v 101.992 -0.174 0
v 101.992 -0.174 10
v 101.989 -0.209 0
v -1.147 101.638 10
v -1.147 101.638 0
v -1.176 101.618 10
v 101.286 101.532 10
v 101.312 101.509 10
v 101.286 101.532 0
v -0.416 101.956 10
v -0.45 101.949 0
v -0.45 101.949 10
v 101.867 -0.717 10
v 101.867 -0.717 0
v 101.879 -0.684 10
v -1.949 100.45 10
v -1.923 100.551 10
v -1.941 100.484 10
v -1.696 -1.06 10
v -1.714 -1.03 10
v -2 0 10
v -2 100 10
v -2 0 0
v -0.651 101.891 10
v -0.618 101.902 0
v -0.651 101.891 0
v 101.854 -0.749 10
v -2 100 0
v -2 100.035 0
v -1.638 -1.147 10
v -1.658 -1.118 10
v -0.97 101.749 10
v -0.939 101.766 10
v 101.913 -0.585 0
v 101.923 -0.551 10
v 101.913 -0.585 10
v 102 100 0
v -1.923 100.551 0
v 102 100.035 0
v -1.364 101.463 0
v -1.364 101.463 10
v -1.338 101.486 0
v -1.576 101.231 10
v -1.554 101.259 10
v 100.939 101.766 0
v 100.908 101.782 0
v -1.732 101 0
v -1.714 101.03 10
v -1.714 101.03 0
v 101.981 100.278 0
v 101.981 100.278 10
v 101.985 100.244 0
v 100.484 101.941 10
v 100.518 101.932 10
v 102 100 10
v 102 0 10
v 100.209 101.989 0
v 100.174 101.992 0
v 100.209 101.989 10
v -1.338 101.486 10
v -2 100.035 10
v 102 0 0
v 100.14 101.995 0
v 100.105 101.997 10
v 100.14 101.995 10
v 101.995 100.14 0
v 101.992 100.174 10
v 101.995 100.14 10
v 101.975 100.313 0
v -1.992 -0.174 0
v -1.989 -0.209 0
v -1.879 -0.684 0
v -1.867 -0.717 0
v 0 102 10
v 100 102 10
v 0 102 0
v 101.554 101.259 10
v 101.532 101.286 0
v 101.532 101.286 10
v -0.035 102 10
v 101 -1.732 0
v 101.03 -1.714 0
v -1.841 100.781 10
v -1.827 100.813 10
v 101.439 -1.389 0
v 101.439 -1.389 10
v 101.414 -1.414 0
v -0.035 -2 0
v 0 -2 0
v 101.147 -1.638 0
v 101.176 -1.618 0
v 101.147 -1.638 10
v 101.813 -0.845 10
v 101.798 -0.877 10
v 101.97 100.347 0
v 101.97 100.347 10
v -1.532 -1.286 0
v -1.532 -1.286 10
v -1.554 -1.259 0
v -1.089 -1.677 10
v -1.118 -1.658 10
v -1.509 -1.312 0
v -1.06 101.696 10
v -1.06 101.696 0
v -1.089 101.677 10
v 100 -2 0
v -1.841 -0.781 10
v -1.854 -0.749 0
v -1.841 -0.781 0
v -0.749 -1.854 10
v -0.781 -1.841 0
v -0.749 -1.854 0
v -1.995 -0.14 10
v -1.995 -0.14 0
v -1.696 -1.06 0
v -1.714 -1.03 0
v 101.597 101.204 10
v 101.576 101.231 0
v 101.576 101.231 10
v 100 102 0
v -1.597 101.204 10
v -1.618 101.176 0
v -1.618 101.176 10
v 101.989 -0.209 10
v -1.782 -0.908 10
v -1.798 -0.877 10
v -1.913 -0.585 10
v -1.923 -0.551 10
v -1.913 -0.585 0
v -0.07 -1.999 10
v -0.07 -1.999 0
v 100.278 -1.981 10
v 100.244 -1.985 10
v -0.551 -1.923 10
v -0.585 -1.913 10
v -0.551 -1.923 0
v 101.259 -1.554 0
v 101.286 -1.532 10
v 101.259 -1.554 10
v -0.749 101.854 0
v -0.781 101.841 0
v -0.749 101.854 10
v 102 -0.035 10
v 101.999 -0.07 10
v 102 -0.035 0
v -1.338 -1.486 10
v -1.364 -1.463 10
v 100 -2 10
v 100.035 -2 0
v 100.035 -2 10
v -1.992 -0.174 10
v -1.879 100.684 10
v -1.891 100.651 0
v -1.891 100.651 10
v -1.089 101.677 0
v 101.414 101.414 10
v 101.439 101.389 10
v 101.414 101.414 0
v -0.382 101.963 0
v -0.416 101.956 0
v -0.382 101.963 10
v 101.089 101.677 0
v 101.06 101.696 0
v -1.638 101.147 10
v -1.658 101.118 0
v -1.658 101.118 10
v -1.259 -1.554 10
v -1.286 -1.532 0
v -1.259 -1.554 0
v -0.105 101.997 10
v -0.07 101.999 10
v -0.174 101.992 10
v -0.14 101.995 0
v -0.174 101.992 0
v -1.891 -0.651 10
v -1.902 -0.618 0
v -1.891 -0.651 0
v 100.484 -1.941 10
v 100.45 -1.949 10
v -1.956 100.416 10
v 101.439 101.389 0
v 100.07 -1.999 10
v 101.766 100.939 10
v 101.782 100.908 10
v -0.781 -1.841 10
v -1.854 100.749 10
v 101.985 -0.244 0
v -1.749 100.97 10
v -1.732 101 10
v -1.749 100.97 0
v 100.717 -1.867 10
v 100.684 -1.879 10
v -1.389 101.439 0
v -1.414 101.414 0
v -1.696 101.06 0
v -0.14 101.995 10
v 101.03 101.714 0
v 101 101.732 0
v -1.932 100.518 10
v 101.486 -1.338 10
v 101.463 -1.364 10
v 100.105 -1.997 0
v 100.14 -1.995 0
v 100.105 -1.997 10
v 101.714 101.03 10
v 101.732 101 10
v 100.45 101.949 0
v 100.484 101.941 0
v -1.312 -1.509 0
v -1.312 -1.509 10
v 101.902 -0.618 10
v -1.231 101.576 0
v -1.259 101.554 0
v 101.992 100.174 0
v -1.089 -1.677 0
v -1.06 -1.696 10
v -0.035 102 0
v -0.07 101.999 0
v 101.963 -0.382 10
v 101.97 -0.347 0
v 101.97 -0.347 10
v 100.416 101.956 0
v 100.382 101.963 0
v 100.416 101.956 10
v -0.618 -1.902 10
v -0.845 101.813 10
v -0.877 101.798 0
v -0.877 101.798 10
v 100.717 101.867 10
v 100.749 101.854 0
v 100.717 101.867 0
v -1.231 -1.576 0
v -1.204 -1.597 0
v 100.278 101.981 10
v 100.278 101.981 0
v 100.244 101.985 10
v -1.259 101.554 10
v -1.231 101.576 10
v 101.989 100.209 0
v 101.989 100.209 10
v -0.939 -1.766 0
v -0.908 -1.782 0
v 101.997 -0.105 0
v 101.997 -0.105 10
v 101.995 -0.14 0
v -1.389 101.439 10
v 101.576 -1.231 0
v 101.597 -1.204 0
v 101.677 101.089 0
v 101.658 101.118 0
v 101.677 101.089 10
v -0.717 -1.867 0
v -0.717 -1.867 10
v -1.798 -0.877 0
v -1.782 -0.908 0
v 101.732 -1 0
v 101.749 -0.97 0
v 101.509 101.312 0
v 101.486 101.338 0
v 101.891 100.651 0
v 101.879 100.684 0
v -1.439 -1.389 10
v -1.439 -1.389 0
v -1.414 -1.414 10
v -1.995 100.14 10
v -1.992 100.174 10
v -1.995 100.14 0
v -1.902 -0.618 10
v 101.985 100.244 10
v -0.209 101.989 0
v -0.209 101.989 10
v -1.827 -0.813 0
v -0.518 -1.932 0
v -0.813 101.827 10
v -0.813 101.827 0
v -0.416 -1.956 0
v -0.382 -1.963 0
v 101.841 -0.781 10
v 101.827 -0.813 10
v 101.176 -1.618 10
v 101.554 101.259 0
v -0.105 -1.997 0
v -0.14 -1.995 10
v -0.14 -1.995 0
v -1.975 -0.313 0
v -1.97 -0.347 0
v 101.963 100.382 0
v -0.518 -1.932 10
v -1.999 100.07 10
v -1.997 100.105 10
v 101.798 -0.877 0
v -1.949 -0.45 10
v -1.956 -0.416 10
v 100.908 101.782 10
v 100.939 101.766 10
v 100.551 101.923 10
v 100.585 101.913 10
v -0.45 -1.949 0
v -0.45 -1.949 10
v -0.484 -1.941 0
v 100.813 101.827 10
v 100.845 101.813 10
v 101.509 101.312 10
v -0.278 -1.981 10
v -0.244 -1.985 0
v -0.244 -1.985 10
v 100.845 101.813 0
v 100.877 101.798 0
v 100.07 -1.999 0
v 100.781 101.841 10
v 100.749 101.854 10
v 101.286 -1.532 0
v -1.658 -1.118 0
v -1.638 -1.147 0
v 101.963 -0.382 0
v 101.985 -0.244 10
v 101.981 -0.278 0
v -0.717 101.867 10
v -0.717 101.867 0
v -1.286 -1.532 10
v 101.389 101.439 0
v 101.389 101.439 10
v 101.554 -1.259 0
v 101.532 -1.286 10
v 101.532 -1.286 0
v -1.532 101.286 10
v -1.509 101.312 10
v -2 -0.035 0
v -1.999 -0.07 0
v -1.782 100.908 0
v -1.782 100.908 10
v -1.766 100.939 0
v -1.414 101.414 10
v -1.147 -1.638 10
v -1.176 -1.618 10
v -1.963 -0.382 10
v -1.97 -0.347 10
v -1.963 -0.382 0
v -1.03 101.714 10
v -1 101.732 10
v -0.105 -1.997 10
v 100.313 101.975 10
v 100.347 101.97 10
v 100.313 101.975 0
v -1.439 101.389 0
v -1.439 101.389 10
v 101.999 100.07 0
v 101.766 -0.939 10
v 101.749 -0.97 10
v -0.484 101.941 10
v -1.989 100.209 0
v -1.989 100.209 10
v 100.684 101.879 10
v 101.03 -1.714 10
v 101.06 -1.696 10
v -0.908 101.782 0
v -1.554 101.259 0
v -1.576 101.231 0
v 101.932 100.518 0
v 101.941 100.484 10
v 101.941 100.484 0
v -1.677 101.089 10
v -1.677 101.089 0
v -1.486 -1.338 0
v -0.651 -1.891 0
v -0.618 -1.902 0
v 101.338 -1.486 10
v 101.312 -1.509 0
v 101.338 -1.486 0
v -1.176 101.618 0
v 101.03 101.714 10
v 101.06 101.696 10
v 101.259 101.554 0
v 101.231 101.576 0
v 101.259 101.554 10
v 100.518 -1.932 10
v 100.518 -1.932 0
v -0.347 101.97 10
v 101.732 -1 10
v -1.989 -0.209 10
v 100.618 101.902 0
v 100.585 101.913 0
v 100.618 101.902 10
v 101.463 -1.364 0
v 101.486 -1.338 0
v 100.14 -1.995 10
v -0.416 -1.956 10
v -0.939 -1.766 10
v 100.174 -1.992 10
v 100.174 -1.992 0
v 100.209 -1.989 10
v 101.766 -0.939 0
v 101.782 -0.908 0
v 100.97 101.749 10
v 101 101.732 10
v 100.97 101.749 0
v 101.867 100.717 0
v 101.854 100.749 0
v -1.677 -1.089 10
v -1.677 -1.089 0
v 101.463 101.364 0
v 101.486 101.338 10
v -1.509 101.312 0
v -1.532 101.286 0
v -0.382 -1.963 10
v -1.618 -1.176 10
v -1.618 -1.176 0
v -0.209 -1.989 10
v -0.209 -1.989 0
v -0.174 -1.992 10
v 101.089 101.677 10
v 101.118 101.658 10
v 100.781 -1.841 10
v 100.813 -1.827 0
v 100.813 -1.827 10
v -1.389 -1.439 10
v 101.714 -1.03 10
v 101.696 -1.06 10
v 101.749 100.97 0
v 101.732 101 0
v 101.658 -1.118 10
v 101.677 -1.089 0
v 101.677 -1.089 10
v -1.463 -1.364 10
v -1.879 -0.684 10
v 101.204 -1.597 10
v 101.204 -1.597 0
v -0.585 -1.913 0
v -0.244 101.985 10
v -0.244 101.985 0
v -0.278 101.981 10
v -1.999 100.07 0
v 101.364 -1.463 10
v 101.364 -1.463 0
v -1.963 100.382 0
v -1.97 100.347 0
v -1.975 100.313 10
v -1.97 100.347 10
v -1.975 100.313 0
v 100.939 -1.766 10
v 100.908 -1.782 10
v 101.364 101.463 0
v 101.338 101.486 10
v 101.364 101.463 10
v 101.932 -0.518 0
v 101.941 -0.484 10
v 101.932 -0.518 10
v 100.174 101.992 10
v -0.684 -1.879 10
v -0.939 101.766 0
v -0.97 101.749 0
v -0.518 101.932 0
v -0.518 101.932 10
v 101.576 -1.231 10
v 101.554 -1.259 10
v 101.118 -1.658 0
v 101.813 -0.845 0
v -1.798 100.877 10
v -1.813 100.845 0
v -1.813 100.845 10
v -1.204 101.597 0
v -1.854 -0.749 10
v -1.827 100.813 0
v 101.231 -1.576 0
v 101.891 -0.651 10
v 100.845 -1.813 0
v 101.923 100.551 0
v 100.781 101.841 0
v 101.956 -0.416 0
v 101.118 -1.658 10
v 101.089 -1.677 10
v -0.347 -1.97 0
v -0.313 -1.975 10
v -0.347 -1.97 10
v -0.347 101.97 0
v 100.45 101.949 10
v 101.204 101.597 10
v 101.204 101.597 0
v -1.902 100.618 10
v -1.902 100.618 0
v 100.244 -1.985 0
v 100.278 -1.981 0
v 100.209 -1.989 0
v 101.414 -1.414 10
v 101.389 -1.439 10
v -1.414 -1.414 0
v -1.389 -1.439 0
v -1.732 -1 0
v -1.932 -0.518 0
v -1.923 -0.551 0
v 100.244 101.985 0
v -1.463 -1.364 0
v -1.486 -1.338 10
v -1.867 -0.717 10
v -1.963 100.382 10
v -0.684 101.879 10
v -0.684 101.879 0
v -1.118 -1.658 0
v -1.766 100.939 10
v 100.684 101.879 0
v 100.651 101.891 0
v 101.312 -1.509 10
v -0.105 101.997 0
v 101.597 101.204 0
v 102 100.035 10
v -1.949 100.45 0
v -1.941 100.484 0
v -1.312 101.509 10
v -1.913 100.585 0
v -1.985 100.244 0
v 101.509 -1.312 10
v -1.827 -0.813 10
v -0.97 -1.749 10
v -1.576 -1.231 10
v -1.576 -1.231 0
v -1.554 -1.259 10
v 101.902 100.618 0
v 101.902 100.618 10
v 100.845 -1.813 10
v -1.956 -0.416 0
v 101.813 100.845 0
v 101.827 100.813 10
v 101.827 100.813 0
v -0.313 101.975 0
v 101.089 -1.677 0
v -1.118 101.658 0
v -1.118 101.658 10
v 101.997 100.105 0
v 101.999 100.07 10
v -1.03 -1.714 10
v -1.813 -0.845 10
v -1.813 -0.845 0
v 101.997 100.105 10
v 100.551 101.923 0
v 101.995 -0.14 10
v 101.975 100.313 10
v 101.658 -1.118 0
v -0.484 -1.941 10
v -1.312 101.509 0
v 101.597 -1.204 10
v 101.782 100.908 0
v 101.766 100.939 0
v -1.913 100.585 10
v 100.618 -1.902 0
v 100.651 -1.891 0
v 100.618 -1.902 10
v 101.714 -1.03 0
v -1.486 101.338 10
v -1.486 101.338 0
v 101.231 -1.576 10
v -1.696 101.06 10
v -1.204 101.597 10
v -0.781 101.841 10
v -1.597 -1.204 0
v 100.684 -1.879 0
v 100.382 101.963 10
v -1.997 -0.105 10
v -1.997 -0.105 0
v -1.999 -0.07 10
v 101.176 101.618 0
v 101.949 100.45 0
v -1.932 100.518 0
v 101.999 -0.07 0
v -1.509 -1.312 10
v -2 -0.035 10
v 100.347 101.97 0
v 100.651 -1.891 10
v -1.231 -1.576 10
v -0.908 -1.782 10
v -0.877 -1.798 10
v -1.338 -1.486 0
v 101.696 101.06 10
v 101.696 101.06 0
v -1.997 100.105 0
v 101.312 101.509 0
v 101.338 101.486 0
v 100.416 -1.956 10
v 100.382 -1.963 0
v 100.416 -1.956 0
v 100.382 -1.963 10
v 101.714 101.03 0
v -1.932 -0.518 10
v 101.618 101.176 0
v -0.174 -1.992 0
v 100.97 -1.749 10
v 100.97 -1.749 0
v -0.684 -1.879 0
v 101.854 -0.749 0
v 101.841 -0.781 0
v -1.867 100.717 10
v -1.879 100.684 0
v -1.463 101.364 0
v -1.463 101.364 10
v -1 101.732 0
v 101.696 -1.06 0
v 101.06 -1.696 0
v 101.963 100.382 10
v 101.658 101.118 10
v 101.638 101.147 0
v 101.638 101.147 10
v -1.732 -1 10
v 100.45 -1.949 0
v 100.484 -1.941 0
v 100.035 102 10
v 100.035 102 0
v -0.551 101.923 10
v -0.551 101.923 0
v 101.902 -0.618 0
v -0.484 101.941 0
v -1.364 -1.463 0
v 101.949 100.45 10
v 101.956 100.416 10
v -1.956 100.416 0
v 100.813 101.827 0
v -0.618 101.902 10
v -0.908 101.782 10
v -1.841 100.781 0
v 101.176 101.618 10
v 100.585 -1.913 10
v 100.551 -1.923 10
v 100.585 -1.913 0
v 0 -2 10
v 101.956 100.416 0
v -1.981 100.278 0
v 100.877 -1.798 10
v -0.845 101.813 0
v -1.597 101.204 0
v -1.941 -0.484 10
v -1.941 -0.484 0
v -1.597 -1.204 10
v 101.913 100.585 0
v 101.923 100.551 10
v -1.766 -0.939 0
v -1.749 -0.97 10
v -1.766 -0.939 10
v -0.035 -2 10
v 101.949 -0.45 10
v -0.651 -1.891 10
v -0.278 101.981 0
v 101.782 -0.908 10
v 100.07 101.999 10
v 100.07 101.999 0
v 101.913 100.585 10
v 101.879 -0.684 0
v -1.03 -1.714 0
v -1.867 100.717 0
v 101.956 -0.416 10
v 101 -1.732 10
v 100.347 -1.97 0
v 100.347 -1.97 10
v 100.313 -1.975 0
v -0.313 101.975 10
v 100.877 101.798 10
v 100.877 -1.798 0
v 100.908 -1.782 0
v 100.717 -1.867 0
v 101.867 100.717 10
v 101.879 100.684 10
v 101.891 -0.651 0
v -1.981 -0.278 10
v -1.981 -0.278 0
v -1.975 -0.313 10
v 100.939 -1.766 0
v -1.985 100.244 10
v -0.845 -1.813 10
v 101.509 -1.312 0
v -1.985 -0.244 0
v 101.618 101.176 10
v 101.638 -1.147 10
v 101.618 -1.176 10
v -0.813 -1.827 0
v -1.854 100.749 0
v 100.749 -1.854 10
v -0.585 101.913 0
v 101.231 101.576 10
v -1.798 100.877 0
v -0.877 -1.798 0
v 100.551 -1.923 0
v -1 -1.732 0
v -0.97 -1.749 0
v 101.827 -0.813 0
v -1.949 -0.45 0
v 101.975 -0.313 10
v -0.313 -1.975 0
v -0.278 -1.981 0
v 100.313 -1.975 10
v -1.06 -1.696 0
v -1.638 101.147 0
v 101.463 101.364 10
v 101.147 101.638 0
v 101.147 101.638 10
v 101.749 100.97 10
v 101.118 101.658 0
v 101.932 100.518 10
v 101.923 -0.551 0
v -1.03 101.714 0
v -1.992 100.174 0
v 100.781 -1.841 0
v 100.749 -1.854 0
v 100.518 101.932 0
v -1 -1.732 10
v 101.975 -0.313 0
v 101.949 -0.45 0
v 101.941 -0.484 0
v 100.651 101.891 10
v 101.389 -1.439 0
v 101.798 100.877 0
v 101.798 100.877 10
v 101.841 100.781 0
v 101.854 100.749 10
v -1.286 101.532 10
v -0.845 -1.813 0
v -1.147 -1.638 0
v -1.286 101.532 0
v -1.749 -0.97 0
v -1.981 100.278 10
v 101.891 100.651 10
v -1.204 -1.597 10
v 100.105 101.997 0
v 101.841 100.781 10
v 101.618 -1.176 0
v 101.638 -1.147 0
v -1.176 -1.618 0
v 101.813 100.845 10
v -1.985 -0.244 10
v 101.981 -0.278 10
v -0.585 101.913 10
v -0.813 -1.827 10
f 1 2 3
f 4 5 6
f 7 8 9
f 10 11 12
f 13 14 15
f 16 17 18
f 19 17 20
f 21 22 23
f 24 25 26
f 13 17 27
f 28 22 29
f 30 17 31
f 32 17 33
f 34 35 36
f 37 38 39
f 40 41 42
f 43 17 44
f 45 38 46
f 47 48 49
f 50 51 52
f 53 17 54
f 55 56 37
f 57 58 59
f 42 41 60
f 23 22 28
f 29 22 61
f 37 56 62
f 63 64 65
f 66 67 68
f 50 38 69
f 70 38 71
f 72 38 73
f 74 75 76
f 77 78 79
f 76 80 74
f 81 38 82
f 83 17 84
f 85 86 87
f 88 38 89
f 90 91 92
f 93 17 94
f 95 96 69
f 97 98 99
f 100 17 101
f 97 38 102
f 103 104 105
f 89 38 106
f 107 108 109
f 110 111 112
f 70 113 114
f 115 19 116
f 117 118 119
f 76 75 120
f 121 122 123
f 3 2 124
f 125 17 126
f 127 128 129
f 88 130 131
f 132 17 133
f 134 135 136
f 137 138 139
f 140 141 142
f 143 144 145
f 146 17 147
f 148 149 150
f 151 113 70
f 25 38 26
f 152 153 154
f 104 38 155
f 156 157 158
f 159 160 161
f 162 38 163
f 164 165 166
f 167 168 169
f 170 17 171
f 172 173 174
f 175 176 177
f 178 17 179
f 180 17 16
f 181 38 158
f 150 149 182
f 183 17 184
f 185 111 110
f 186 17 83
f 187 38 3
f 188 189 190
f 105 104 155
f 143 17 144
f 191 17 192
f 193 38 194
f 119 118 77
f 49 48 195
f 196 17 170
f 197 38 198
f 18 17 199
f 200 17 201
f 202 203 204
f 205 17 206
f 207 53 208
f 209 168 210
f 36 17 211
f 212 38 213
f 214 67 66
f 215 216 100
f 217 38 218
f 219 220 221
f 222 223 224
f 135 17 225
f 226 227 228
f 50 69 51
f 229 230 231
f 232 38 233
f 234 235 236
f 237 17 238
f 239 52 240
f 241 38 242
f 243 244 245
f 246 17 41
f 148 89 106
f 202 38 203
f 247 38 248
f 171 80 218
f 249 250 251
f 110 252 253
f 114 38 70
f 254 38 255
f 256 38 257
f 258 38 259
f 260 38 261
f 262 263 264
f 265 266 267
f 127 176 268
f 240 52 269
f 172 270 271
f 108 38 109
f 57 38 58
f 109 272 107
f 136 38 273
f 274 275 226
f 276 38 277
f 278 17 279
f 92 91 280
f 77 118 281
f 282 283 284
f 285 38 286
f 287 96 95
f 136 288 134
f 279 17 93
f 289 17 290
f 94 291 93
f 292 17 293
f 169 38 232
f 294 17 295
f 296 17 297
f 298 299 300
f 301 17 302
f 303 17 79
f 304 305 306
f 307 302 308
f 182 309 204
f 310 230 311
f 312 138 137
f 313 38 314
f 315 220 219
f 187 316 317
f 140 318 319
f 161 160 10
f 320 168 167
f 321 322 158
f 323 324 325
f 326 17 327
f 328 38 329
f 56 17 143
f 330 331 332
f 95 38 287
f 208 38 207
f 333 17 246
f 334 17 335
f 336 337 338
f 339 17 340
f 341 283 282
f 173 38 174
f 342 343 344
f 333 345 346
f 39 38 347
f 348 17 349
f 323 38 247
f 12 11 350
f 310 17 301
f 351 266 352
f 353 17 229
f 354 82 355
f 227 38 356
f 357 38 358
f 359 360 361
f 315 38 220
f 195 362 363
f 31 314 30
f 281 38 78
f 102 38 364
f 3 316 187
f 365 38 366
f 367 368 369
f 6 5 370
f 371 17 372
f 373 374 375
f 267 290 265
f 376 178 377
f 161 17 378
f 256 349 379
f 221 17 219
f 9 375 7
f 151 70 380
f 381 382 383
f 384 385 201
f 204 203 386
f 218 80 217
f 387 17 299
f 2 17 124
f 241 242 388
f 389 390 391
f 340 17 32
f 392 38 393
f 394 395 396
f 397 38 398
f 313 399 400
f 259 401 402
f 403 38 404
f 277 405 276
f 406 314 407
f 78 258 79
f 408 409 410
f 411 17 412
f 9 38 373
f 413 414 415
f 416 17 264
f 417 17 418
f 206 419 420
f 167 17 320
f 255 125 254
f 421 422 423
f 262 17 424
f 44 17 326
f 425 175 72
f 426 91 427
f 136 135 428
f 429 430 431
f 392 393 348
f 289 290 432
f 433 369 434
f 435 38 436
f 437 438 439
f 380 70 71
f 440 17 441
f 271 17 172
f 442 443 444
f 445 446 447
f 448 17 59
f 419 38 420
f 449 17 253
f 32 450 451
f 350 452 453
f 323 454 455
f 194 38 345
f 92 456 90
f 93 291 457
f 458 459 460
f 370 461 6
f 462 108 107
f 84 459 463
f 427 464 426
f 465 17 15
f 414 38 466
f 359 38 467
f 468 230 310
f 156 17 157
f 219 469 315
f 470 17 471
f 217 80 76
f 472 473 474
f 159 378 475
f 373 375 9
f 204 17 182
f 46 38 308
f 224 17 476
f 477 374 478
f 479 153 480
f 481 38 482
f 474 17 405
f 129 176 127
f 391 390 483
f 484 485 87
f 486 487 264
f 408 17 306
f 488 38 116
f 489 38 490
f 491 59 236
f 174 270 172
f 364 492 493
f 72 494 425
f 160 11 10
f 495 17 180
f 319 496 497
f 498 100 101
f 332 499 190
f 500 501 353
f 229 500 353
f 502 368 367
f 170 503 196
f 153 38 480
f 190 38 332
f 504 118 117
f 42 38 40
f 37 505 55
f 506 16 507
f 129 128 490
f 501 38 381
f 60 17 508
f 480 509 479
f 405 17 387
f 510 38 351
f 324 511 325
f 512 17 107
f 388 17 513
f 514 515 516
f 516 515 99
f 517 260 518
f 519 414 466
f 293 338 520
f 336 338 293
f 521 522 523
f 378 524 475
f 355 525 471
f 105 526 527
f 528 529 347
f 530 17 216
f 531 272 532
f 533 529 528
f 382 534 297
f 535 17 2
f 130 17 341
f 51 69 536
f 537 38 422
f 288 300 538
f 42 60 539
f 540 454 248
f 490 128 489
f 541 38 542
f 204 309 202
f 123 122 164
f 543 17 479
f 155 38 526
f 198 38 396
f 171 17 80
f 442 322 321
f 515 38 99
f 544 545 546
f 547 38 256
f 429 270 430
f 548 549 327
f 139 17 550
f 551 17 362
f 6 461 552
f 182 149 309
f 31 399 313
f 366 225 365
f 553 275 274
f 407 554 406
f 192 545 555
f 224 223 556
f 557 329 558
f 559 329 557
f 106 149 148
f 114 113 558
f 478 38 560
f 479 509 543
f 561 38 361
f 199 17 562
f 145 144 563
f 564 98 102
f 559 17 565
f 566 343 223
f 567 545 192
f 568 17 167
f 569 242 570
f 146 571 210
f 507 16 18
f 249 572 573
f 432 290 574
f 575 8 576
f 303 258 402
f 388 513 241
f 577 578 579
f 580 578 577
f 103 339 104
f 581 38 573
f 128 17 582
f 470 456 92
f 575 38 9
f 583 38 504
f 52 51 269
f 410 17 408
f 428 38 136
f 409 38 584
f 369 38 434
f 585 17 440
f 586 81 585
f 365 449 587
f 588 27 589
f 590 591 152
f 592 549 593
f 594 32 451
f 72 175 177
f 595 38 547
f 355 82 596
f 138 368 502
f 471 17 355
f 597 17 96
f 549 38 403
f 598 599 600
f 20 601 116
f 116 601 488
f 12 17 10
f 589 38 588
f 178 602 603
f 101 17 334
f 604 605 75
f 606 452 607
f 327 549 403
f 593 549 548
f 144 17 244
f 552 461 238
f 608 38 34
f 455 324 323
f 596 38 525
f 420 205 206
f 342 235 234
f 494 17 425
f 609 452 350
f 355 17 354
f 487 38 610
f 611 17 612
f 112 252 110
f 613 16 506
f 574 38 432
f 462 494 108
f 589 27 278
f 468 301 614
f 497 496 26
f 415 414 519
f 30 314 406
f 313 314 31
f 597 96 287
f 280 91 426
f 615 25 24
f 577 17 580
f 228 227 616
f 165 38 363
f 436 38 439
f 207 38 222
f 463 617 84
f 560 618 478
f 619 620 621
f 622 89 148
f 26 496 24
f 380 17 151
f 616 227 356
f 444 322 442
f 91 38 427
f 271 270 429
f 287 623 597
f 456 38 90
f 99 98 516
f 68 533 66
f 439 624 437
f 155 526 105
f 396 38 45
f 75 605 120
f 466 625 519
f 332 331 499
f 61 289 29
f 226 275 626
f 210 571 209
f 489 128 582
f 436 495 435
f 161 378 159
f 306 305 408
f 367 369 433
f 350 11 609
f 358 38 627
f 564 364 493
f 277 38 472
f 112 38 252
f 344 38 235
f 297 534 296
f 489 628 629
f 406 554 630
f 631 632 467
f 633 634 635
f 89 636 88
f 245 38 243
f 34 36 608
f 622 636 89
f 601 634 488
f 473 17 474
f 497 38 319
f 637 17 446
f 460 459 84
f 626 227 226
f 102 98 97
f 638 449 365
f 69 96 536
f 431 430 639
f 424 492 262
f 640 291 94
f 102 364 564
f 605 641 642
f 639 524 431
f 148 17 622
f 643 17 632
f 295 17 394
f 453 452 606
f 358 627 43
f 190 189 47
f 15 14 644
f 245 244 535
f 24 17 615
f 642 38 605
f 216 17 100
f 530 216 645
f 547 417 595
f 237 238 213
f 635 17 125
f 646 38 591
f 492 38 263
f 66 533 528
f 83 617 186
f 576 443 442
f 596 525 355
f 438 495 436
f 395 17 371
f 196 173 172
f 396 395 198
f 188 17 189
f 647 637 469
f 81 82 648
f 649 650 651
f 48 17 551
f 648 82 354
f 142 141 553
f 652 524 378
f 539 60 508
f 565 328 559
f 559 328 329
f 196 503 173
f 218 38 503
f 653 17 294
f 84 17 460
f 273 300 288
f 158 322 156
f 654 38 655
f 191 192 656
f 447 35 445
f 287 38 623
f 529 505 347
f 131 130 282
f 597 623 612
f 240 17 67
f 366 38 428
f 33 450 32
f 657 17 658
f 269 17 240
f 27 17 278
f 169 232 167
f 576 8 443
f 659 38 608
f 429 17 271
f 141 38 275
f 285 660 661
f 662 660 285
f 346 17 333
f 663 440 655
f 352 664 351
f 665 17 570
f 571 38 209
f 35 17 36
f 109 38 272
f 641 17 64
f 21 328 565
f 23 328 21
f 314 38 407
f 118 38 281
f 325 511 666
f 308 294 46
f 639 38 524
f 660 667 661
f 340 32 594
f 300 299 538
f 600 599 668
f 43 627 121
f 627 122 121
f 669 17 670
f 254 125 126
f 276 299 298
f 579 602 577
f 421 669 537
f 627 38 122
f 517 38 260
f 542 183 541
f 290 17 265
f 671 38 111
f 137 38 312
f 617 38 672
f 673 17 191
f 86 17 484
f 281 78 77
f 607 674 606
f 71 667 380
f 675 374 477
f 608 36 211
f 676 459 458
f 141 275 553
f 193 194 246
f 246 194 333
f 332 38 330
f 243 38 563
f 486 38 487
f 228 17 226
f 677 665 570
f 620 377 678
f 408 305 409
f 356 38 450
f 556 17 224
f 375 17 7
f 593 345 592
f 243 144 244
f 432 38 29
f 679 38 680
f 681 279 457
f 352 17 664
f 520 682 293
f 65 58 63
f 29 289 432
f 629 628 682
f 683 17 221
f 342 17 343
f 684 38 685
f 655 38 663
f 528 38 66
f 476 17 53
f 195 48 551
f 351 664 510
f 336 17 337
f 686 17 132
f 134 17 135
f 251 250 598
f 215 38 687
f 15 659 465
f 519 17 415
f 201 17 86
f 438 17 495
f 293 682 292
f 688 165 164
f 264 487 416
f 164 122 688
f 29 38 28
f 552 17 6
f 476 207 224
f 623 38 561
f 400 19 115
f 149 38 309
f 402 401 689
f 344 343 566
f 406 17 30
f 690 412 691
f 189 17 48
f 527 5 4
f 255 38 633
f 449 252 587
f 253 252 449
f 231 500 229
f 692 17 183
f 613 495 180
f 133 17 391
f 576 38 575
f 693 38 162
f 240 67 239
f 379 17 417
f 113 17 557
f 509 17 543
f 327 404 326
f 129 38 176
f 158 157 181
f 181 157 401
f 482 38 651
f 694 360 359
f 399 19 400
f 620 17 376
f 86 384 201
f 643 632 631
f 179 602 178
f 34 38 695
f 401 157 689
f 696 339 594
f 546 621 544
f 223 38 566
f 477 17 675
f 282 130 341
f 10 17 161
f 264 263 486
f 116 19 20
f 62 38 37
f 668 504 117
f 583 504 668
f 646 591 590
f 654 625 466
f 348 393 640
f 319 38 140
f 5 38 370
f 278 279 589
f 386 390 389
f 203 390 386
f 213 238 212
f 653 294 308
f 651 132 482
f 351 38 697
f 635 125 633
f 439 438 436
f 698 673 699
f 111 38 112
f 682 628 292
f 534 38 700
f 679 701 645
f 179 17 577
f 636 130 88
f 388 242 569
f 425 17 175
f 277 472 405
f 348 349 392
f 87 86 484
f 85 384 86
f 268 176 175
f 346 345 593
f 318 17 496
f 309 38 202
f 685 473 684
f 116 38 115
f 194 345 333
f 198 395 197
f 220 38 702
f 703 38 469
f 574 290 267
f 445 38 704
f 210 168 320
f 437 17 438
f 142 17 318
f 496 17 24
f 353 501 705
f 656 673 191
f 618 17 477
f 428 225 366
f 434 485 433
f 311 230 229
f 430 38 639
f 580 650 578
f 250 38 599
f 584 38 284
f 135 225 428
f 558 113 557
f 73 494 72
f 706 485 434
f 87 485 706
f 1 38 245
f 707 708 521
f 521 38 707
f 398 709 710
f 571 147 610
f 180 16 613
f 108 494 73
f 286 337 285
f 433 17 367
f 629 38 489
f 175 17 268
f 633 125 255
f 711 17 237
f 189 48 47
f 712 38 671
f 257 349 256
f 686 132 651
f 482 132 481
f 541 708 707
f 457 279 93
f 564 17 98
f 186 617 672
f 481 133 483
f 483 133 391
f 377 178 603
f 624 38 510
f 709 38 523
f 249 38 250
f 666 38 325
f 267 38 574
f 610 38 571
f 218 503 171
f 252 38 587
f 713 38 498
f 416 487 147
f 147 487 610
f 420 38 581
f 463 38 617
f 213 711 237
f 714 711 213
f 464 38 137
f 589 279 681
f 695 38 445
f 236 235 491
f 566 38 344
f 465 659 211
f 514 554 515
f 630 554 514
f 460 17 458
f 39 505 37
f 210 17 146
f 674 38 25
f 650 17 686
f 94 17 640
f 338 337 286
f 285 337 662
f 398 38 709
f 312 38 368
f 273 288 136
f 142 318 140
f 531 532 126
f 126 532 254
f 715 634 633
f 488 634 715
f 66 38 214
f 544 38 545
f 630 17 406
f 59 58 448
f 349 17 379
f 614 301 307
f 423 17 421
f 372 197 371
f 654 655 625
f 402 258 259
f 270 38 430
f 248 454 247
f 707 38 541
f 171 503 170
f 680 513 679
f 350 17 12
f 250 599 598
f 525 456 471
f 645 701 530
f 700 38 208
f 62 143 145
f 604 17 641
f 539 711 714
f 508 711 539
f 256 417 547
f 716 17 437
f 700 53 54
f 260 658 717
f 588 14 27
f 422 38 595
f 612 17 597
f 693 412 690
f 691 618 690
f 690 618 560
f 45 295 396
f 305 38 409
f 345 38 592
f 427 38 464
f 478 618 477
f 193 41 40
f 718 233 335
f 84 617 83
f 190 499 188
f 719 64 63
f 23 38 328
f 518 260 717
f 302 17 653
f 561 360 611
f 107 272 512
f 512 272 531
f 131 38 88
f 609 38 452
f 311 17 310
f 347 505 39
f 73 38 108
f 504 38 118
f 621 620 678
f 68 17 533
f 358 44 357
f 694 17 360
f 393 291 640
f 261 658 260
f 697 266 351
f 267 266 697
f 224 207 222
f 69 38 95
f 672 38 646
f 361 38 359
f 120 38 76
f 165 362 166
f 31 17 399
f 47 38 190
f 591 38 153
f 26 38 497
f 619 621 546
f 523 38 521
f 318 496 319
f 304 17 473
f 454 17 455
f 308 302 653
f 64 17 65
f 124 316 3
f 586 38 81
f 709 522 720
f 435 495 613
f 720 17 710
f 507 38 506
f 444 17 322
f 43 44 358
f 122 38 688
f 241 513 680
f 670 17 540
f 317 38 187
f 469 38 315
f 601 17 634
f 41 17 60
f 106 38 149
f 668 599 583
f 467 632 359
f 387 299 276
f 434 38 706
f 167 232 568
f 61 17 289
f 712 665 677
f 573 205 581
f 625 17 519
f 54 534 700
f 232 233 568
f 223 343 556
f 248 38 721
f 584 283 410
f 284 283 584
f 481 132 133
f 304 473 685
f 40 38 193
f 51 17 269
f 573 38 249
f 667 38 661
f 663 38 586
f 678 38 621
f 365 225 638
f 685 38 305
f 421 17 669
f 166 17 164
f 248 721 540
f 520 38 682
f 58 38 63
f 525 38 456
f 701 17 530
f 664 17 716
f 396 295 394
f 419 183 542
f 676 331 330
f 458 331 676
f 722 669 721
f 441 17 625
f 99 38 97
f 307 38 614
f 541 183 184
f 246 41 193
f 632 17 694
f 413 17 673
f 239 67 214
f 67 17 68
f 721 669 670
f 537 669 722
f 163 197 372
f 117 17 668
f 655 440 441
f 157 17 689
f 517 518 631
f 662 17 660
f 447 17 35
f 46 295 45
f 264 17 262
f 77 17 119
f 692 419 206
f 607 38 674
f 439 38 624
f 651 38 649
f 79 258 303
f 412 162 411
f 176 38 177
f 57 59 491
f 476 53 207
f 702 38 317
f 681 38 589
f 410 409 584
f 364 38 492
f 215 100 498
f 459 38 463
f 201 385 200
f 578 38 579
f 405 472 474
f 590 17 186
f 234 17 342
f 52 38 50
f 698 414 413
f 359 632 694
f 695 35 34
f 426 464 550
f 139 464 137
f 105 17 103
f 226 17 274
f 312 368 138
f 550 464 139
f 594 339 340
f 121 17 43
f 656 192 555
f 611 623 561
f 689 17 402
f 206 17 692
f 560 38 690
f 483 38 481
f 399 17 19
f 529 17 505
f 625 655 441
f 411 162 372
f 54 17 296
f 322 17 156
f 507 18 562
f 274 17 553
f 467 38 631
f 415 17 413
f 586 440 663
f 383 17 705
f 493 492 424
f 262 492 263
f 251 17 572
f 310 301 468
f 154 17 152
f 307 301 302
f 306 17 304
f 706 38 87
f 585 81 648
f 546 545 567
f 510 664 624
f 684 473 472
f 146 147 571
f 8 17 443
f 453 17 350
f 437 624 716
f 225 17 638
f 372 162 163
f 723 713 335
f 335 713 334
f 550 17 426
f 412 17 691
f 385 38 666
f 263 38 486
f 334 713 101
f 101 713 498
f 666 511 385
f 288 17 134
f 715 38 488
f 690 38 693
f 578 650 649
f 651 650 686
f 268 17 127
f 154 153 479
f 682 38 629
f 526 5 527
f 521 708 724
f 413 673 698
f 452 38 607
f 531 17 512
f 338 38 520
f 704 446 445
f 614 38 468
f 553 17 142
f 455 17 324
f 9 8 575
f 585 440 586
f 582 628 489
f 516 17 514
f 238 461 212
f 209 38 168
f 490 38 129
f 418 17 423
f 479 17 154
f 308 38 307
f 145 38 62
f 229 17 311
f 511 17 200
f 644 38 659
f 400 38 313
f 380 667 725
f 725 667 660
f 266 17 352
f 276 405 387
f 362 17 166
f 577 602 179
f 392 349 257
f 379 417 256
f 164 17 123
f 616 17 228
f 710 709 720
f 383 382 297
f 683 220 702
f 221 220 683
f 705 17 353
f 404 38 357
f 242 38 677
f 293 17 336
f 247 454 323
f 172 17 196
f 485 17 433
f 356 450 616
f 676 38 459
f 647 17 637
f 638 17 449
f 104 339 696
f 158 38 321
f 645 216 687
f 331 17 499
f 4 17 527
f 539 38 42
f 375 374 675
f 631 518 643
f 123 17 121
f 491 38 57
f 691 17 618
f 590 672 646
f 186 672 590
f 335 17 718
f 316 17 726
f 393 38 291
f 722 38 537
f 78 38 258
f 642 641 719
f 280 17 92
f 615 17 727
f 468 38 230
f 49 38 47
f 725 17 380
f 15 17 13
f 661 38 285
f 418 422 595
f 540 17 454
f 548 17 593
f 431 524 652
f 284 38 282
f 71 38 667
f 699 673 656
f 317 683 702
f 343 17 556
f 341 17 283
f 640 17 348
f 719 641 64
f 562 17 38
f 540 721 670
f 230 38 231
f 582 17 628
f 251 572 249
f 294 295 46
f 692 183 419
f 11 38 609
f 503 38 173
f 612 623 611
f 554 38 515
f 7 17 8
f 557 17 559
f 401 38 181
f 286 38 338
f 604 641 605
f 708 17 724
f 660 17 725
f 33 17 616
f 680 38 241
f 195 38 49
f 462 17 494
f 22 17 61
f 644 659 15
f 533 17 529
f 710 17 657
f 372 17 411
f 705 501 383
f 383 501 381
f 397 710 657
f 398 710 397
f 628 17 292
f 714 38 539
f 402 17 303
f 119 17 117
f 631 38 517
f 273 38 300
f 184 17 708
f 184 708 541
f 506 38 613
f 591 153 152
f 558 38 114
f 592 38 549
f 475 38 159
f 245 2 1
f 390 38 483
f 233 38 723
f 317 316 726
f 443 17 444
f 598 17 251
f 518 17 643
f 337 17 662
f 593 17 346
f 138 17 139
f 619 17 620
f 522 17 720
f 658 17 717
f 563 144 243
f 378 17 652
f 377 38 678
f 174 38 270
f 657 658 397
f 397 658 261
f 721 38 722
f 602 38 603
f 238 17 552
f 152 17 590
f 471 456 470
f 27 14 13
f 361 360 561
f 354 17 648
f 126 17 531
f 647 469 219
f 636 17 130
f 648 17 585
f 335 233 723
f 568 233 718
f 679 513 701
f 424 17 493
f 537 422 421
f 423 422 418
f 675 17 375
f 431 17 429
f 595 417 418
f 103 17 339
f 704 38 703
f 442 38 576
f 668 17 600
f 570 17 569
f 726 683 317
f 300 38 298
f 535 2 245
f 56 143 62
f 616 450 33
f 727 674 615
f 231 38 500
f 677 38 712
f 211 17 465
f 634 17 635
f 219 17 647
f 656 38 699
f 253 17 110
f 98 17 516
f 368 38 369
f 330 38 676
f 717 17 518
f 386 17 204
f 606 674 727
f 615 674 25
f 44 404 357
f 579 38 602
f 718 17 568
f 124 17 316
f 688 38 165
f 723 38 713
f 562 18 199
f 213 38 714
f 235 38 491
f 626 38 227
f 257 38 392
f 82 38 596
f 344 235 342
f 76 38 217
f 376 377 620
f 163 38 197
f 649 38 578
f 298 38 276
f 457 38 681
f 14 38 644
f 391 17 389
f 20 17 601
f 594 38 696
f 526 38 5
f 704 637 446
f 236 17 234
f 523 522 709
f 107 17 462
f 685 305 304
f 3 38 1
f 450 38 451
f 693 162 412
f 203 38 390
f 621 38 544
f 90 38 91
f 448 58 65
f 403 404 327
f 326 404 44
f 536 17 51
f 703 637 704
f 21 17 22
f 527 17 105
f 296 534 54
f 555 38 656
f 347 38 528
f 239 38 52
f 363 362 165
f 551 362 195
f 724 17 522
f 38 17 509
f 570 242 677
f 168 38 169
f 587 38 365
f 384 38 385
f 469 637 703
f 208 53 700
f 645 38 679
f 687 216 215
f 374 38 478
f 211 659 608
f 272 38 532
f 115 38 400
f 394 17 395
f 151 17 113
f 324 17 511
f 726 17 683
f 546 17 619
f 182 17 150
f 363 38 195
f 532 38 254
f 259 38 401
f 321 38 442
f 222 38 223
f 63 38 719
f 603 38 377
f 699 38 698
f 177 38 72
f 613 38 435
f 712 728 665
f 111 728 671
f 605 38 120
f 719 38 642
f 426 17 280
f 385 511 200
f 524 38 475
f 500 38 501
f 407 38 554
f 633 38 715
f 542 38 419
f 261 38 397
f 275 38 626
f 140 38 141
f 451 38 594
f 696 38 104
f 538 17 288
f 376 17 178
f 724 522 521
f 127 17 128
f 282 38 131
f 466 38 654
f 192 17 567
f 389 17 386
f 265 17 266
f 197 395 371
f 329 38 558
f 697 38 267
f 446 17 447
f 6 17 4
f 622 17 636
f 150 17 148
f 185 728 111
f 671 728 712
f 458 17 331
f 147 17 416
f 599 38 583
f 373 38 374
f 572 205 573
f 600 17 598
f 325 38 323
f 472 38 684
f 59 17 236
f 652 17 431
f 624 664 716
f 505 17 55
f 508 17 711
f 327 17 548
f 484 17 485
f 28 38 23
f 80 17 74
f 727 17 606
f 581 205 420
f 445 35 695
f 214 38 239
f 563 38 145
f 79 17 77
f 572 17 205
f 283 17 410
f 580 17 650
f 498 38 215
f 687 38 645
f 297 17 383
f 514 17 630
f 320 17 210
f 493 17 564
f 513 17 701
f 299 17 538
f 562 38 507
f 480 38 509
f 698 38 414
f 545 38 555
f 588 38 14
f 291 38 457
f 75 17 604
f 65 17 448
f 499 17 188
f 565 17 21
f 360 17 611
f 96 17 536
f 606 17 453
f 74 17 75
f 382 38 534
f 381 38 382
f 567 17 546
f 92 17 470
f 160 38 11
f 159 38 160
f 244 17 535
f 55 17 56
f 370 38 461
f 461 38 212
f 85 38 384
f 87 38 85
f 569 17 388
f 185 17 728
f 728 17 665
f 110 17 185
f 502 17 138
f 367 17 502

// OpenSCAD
$fn = 360;

hull() {
	cylinder(r=2, h=10);
	translate([100, 0, 0]) {
		cylinder(r=2, h=10);
		translate([0, 100, 0]) {
			cylinder(r=2, h=10);
		}
	}
	translate([0, 100, 0]) {
		cylinder(r=2, h=10);
	}
}
